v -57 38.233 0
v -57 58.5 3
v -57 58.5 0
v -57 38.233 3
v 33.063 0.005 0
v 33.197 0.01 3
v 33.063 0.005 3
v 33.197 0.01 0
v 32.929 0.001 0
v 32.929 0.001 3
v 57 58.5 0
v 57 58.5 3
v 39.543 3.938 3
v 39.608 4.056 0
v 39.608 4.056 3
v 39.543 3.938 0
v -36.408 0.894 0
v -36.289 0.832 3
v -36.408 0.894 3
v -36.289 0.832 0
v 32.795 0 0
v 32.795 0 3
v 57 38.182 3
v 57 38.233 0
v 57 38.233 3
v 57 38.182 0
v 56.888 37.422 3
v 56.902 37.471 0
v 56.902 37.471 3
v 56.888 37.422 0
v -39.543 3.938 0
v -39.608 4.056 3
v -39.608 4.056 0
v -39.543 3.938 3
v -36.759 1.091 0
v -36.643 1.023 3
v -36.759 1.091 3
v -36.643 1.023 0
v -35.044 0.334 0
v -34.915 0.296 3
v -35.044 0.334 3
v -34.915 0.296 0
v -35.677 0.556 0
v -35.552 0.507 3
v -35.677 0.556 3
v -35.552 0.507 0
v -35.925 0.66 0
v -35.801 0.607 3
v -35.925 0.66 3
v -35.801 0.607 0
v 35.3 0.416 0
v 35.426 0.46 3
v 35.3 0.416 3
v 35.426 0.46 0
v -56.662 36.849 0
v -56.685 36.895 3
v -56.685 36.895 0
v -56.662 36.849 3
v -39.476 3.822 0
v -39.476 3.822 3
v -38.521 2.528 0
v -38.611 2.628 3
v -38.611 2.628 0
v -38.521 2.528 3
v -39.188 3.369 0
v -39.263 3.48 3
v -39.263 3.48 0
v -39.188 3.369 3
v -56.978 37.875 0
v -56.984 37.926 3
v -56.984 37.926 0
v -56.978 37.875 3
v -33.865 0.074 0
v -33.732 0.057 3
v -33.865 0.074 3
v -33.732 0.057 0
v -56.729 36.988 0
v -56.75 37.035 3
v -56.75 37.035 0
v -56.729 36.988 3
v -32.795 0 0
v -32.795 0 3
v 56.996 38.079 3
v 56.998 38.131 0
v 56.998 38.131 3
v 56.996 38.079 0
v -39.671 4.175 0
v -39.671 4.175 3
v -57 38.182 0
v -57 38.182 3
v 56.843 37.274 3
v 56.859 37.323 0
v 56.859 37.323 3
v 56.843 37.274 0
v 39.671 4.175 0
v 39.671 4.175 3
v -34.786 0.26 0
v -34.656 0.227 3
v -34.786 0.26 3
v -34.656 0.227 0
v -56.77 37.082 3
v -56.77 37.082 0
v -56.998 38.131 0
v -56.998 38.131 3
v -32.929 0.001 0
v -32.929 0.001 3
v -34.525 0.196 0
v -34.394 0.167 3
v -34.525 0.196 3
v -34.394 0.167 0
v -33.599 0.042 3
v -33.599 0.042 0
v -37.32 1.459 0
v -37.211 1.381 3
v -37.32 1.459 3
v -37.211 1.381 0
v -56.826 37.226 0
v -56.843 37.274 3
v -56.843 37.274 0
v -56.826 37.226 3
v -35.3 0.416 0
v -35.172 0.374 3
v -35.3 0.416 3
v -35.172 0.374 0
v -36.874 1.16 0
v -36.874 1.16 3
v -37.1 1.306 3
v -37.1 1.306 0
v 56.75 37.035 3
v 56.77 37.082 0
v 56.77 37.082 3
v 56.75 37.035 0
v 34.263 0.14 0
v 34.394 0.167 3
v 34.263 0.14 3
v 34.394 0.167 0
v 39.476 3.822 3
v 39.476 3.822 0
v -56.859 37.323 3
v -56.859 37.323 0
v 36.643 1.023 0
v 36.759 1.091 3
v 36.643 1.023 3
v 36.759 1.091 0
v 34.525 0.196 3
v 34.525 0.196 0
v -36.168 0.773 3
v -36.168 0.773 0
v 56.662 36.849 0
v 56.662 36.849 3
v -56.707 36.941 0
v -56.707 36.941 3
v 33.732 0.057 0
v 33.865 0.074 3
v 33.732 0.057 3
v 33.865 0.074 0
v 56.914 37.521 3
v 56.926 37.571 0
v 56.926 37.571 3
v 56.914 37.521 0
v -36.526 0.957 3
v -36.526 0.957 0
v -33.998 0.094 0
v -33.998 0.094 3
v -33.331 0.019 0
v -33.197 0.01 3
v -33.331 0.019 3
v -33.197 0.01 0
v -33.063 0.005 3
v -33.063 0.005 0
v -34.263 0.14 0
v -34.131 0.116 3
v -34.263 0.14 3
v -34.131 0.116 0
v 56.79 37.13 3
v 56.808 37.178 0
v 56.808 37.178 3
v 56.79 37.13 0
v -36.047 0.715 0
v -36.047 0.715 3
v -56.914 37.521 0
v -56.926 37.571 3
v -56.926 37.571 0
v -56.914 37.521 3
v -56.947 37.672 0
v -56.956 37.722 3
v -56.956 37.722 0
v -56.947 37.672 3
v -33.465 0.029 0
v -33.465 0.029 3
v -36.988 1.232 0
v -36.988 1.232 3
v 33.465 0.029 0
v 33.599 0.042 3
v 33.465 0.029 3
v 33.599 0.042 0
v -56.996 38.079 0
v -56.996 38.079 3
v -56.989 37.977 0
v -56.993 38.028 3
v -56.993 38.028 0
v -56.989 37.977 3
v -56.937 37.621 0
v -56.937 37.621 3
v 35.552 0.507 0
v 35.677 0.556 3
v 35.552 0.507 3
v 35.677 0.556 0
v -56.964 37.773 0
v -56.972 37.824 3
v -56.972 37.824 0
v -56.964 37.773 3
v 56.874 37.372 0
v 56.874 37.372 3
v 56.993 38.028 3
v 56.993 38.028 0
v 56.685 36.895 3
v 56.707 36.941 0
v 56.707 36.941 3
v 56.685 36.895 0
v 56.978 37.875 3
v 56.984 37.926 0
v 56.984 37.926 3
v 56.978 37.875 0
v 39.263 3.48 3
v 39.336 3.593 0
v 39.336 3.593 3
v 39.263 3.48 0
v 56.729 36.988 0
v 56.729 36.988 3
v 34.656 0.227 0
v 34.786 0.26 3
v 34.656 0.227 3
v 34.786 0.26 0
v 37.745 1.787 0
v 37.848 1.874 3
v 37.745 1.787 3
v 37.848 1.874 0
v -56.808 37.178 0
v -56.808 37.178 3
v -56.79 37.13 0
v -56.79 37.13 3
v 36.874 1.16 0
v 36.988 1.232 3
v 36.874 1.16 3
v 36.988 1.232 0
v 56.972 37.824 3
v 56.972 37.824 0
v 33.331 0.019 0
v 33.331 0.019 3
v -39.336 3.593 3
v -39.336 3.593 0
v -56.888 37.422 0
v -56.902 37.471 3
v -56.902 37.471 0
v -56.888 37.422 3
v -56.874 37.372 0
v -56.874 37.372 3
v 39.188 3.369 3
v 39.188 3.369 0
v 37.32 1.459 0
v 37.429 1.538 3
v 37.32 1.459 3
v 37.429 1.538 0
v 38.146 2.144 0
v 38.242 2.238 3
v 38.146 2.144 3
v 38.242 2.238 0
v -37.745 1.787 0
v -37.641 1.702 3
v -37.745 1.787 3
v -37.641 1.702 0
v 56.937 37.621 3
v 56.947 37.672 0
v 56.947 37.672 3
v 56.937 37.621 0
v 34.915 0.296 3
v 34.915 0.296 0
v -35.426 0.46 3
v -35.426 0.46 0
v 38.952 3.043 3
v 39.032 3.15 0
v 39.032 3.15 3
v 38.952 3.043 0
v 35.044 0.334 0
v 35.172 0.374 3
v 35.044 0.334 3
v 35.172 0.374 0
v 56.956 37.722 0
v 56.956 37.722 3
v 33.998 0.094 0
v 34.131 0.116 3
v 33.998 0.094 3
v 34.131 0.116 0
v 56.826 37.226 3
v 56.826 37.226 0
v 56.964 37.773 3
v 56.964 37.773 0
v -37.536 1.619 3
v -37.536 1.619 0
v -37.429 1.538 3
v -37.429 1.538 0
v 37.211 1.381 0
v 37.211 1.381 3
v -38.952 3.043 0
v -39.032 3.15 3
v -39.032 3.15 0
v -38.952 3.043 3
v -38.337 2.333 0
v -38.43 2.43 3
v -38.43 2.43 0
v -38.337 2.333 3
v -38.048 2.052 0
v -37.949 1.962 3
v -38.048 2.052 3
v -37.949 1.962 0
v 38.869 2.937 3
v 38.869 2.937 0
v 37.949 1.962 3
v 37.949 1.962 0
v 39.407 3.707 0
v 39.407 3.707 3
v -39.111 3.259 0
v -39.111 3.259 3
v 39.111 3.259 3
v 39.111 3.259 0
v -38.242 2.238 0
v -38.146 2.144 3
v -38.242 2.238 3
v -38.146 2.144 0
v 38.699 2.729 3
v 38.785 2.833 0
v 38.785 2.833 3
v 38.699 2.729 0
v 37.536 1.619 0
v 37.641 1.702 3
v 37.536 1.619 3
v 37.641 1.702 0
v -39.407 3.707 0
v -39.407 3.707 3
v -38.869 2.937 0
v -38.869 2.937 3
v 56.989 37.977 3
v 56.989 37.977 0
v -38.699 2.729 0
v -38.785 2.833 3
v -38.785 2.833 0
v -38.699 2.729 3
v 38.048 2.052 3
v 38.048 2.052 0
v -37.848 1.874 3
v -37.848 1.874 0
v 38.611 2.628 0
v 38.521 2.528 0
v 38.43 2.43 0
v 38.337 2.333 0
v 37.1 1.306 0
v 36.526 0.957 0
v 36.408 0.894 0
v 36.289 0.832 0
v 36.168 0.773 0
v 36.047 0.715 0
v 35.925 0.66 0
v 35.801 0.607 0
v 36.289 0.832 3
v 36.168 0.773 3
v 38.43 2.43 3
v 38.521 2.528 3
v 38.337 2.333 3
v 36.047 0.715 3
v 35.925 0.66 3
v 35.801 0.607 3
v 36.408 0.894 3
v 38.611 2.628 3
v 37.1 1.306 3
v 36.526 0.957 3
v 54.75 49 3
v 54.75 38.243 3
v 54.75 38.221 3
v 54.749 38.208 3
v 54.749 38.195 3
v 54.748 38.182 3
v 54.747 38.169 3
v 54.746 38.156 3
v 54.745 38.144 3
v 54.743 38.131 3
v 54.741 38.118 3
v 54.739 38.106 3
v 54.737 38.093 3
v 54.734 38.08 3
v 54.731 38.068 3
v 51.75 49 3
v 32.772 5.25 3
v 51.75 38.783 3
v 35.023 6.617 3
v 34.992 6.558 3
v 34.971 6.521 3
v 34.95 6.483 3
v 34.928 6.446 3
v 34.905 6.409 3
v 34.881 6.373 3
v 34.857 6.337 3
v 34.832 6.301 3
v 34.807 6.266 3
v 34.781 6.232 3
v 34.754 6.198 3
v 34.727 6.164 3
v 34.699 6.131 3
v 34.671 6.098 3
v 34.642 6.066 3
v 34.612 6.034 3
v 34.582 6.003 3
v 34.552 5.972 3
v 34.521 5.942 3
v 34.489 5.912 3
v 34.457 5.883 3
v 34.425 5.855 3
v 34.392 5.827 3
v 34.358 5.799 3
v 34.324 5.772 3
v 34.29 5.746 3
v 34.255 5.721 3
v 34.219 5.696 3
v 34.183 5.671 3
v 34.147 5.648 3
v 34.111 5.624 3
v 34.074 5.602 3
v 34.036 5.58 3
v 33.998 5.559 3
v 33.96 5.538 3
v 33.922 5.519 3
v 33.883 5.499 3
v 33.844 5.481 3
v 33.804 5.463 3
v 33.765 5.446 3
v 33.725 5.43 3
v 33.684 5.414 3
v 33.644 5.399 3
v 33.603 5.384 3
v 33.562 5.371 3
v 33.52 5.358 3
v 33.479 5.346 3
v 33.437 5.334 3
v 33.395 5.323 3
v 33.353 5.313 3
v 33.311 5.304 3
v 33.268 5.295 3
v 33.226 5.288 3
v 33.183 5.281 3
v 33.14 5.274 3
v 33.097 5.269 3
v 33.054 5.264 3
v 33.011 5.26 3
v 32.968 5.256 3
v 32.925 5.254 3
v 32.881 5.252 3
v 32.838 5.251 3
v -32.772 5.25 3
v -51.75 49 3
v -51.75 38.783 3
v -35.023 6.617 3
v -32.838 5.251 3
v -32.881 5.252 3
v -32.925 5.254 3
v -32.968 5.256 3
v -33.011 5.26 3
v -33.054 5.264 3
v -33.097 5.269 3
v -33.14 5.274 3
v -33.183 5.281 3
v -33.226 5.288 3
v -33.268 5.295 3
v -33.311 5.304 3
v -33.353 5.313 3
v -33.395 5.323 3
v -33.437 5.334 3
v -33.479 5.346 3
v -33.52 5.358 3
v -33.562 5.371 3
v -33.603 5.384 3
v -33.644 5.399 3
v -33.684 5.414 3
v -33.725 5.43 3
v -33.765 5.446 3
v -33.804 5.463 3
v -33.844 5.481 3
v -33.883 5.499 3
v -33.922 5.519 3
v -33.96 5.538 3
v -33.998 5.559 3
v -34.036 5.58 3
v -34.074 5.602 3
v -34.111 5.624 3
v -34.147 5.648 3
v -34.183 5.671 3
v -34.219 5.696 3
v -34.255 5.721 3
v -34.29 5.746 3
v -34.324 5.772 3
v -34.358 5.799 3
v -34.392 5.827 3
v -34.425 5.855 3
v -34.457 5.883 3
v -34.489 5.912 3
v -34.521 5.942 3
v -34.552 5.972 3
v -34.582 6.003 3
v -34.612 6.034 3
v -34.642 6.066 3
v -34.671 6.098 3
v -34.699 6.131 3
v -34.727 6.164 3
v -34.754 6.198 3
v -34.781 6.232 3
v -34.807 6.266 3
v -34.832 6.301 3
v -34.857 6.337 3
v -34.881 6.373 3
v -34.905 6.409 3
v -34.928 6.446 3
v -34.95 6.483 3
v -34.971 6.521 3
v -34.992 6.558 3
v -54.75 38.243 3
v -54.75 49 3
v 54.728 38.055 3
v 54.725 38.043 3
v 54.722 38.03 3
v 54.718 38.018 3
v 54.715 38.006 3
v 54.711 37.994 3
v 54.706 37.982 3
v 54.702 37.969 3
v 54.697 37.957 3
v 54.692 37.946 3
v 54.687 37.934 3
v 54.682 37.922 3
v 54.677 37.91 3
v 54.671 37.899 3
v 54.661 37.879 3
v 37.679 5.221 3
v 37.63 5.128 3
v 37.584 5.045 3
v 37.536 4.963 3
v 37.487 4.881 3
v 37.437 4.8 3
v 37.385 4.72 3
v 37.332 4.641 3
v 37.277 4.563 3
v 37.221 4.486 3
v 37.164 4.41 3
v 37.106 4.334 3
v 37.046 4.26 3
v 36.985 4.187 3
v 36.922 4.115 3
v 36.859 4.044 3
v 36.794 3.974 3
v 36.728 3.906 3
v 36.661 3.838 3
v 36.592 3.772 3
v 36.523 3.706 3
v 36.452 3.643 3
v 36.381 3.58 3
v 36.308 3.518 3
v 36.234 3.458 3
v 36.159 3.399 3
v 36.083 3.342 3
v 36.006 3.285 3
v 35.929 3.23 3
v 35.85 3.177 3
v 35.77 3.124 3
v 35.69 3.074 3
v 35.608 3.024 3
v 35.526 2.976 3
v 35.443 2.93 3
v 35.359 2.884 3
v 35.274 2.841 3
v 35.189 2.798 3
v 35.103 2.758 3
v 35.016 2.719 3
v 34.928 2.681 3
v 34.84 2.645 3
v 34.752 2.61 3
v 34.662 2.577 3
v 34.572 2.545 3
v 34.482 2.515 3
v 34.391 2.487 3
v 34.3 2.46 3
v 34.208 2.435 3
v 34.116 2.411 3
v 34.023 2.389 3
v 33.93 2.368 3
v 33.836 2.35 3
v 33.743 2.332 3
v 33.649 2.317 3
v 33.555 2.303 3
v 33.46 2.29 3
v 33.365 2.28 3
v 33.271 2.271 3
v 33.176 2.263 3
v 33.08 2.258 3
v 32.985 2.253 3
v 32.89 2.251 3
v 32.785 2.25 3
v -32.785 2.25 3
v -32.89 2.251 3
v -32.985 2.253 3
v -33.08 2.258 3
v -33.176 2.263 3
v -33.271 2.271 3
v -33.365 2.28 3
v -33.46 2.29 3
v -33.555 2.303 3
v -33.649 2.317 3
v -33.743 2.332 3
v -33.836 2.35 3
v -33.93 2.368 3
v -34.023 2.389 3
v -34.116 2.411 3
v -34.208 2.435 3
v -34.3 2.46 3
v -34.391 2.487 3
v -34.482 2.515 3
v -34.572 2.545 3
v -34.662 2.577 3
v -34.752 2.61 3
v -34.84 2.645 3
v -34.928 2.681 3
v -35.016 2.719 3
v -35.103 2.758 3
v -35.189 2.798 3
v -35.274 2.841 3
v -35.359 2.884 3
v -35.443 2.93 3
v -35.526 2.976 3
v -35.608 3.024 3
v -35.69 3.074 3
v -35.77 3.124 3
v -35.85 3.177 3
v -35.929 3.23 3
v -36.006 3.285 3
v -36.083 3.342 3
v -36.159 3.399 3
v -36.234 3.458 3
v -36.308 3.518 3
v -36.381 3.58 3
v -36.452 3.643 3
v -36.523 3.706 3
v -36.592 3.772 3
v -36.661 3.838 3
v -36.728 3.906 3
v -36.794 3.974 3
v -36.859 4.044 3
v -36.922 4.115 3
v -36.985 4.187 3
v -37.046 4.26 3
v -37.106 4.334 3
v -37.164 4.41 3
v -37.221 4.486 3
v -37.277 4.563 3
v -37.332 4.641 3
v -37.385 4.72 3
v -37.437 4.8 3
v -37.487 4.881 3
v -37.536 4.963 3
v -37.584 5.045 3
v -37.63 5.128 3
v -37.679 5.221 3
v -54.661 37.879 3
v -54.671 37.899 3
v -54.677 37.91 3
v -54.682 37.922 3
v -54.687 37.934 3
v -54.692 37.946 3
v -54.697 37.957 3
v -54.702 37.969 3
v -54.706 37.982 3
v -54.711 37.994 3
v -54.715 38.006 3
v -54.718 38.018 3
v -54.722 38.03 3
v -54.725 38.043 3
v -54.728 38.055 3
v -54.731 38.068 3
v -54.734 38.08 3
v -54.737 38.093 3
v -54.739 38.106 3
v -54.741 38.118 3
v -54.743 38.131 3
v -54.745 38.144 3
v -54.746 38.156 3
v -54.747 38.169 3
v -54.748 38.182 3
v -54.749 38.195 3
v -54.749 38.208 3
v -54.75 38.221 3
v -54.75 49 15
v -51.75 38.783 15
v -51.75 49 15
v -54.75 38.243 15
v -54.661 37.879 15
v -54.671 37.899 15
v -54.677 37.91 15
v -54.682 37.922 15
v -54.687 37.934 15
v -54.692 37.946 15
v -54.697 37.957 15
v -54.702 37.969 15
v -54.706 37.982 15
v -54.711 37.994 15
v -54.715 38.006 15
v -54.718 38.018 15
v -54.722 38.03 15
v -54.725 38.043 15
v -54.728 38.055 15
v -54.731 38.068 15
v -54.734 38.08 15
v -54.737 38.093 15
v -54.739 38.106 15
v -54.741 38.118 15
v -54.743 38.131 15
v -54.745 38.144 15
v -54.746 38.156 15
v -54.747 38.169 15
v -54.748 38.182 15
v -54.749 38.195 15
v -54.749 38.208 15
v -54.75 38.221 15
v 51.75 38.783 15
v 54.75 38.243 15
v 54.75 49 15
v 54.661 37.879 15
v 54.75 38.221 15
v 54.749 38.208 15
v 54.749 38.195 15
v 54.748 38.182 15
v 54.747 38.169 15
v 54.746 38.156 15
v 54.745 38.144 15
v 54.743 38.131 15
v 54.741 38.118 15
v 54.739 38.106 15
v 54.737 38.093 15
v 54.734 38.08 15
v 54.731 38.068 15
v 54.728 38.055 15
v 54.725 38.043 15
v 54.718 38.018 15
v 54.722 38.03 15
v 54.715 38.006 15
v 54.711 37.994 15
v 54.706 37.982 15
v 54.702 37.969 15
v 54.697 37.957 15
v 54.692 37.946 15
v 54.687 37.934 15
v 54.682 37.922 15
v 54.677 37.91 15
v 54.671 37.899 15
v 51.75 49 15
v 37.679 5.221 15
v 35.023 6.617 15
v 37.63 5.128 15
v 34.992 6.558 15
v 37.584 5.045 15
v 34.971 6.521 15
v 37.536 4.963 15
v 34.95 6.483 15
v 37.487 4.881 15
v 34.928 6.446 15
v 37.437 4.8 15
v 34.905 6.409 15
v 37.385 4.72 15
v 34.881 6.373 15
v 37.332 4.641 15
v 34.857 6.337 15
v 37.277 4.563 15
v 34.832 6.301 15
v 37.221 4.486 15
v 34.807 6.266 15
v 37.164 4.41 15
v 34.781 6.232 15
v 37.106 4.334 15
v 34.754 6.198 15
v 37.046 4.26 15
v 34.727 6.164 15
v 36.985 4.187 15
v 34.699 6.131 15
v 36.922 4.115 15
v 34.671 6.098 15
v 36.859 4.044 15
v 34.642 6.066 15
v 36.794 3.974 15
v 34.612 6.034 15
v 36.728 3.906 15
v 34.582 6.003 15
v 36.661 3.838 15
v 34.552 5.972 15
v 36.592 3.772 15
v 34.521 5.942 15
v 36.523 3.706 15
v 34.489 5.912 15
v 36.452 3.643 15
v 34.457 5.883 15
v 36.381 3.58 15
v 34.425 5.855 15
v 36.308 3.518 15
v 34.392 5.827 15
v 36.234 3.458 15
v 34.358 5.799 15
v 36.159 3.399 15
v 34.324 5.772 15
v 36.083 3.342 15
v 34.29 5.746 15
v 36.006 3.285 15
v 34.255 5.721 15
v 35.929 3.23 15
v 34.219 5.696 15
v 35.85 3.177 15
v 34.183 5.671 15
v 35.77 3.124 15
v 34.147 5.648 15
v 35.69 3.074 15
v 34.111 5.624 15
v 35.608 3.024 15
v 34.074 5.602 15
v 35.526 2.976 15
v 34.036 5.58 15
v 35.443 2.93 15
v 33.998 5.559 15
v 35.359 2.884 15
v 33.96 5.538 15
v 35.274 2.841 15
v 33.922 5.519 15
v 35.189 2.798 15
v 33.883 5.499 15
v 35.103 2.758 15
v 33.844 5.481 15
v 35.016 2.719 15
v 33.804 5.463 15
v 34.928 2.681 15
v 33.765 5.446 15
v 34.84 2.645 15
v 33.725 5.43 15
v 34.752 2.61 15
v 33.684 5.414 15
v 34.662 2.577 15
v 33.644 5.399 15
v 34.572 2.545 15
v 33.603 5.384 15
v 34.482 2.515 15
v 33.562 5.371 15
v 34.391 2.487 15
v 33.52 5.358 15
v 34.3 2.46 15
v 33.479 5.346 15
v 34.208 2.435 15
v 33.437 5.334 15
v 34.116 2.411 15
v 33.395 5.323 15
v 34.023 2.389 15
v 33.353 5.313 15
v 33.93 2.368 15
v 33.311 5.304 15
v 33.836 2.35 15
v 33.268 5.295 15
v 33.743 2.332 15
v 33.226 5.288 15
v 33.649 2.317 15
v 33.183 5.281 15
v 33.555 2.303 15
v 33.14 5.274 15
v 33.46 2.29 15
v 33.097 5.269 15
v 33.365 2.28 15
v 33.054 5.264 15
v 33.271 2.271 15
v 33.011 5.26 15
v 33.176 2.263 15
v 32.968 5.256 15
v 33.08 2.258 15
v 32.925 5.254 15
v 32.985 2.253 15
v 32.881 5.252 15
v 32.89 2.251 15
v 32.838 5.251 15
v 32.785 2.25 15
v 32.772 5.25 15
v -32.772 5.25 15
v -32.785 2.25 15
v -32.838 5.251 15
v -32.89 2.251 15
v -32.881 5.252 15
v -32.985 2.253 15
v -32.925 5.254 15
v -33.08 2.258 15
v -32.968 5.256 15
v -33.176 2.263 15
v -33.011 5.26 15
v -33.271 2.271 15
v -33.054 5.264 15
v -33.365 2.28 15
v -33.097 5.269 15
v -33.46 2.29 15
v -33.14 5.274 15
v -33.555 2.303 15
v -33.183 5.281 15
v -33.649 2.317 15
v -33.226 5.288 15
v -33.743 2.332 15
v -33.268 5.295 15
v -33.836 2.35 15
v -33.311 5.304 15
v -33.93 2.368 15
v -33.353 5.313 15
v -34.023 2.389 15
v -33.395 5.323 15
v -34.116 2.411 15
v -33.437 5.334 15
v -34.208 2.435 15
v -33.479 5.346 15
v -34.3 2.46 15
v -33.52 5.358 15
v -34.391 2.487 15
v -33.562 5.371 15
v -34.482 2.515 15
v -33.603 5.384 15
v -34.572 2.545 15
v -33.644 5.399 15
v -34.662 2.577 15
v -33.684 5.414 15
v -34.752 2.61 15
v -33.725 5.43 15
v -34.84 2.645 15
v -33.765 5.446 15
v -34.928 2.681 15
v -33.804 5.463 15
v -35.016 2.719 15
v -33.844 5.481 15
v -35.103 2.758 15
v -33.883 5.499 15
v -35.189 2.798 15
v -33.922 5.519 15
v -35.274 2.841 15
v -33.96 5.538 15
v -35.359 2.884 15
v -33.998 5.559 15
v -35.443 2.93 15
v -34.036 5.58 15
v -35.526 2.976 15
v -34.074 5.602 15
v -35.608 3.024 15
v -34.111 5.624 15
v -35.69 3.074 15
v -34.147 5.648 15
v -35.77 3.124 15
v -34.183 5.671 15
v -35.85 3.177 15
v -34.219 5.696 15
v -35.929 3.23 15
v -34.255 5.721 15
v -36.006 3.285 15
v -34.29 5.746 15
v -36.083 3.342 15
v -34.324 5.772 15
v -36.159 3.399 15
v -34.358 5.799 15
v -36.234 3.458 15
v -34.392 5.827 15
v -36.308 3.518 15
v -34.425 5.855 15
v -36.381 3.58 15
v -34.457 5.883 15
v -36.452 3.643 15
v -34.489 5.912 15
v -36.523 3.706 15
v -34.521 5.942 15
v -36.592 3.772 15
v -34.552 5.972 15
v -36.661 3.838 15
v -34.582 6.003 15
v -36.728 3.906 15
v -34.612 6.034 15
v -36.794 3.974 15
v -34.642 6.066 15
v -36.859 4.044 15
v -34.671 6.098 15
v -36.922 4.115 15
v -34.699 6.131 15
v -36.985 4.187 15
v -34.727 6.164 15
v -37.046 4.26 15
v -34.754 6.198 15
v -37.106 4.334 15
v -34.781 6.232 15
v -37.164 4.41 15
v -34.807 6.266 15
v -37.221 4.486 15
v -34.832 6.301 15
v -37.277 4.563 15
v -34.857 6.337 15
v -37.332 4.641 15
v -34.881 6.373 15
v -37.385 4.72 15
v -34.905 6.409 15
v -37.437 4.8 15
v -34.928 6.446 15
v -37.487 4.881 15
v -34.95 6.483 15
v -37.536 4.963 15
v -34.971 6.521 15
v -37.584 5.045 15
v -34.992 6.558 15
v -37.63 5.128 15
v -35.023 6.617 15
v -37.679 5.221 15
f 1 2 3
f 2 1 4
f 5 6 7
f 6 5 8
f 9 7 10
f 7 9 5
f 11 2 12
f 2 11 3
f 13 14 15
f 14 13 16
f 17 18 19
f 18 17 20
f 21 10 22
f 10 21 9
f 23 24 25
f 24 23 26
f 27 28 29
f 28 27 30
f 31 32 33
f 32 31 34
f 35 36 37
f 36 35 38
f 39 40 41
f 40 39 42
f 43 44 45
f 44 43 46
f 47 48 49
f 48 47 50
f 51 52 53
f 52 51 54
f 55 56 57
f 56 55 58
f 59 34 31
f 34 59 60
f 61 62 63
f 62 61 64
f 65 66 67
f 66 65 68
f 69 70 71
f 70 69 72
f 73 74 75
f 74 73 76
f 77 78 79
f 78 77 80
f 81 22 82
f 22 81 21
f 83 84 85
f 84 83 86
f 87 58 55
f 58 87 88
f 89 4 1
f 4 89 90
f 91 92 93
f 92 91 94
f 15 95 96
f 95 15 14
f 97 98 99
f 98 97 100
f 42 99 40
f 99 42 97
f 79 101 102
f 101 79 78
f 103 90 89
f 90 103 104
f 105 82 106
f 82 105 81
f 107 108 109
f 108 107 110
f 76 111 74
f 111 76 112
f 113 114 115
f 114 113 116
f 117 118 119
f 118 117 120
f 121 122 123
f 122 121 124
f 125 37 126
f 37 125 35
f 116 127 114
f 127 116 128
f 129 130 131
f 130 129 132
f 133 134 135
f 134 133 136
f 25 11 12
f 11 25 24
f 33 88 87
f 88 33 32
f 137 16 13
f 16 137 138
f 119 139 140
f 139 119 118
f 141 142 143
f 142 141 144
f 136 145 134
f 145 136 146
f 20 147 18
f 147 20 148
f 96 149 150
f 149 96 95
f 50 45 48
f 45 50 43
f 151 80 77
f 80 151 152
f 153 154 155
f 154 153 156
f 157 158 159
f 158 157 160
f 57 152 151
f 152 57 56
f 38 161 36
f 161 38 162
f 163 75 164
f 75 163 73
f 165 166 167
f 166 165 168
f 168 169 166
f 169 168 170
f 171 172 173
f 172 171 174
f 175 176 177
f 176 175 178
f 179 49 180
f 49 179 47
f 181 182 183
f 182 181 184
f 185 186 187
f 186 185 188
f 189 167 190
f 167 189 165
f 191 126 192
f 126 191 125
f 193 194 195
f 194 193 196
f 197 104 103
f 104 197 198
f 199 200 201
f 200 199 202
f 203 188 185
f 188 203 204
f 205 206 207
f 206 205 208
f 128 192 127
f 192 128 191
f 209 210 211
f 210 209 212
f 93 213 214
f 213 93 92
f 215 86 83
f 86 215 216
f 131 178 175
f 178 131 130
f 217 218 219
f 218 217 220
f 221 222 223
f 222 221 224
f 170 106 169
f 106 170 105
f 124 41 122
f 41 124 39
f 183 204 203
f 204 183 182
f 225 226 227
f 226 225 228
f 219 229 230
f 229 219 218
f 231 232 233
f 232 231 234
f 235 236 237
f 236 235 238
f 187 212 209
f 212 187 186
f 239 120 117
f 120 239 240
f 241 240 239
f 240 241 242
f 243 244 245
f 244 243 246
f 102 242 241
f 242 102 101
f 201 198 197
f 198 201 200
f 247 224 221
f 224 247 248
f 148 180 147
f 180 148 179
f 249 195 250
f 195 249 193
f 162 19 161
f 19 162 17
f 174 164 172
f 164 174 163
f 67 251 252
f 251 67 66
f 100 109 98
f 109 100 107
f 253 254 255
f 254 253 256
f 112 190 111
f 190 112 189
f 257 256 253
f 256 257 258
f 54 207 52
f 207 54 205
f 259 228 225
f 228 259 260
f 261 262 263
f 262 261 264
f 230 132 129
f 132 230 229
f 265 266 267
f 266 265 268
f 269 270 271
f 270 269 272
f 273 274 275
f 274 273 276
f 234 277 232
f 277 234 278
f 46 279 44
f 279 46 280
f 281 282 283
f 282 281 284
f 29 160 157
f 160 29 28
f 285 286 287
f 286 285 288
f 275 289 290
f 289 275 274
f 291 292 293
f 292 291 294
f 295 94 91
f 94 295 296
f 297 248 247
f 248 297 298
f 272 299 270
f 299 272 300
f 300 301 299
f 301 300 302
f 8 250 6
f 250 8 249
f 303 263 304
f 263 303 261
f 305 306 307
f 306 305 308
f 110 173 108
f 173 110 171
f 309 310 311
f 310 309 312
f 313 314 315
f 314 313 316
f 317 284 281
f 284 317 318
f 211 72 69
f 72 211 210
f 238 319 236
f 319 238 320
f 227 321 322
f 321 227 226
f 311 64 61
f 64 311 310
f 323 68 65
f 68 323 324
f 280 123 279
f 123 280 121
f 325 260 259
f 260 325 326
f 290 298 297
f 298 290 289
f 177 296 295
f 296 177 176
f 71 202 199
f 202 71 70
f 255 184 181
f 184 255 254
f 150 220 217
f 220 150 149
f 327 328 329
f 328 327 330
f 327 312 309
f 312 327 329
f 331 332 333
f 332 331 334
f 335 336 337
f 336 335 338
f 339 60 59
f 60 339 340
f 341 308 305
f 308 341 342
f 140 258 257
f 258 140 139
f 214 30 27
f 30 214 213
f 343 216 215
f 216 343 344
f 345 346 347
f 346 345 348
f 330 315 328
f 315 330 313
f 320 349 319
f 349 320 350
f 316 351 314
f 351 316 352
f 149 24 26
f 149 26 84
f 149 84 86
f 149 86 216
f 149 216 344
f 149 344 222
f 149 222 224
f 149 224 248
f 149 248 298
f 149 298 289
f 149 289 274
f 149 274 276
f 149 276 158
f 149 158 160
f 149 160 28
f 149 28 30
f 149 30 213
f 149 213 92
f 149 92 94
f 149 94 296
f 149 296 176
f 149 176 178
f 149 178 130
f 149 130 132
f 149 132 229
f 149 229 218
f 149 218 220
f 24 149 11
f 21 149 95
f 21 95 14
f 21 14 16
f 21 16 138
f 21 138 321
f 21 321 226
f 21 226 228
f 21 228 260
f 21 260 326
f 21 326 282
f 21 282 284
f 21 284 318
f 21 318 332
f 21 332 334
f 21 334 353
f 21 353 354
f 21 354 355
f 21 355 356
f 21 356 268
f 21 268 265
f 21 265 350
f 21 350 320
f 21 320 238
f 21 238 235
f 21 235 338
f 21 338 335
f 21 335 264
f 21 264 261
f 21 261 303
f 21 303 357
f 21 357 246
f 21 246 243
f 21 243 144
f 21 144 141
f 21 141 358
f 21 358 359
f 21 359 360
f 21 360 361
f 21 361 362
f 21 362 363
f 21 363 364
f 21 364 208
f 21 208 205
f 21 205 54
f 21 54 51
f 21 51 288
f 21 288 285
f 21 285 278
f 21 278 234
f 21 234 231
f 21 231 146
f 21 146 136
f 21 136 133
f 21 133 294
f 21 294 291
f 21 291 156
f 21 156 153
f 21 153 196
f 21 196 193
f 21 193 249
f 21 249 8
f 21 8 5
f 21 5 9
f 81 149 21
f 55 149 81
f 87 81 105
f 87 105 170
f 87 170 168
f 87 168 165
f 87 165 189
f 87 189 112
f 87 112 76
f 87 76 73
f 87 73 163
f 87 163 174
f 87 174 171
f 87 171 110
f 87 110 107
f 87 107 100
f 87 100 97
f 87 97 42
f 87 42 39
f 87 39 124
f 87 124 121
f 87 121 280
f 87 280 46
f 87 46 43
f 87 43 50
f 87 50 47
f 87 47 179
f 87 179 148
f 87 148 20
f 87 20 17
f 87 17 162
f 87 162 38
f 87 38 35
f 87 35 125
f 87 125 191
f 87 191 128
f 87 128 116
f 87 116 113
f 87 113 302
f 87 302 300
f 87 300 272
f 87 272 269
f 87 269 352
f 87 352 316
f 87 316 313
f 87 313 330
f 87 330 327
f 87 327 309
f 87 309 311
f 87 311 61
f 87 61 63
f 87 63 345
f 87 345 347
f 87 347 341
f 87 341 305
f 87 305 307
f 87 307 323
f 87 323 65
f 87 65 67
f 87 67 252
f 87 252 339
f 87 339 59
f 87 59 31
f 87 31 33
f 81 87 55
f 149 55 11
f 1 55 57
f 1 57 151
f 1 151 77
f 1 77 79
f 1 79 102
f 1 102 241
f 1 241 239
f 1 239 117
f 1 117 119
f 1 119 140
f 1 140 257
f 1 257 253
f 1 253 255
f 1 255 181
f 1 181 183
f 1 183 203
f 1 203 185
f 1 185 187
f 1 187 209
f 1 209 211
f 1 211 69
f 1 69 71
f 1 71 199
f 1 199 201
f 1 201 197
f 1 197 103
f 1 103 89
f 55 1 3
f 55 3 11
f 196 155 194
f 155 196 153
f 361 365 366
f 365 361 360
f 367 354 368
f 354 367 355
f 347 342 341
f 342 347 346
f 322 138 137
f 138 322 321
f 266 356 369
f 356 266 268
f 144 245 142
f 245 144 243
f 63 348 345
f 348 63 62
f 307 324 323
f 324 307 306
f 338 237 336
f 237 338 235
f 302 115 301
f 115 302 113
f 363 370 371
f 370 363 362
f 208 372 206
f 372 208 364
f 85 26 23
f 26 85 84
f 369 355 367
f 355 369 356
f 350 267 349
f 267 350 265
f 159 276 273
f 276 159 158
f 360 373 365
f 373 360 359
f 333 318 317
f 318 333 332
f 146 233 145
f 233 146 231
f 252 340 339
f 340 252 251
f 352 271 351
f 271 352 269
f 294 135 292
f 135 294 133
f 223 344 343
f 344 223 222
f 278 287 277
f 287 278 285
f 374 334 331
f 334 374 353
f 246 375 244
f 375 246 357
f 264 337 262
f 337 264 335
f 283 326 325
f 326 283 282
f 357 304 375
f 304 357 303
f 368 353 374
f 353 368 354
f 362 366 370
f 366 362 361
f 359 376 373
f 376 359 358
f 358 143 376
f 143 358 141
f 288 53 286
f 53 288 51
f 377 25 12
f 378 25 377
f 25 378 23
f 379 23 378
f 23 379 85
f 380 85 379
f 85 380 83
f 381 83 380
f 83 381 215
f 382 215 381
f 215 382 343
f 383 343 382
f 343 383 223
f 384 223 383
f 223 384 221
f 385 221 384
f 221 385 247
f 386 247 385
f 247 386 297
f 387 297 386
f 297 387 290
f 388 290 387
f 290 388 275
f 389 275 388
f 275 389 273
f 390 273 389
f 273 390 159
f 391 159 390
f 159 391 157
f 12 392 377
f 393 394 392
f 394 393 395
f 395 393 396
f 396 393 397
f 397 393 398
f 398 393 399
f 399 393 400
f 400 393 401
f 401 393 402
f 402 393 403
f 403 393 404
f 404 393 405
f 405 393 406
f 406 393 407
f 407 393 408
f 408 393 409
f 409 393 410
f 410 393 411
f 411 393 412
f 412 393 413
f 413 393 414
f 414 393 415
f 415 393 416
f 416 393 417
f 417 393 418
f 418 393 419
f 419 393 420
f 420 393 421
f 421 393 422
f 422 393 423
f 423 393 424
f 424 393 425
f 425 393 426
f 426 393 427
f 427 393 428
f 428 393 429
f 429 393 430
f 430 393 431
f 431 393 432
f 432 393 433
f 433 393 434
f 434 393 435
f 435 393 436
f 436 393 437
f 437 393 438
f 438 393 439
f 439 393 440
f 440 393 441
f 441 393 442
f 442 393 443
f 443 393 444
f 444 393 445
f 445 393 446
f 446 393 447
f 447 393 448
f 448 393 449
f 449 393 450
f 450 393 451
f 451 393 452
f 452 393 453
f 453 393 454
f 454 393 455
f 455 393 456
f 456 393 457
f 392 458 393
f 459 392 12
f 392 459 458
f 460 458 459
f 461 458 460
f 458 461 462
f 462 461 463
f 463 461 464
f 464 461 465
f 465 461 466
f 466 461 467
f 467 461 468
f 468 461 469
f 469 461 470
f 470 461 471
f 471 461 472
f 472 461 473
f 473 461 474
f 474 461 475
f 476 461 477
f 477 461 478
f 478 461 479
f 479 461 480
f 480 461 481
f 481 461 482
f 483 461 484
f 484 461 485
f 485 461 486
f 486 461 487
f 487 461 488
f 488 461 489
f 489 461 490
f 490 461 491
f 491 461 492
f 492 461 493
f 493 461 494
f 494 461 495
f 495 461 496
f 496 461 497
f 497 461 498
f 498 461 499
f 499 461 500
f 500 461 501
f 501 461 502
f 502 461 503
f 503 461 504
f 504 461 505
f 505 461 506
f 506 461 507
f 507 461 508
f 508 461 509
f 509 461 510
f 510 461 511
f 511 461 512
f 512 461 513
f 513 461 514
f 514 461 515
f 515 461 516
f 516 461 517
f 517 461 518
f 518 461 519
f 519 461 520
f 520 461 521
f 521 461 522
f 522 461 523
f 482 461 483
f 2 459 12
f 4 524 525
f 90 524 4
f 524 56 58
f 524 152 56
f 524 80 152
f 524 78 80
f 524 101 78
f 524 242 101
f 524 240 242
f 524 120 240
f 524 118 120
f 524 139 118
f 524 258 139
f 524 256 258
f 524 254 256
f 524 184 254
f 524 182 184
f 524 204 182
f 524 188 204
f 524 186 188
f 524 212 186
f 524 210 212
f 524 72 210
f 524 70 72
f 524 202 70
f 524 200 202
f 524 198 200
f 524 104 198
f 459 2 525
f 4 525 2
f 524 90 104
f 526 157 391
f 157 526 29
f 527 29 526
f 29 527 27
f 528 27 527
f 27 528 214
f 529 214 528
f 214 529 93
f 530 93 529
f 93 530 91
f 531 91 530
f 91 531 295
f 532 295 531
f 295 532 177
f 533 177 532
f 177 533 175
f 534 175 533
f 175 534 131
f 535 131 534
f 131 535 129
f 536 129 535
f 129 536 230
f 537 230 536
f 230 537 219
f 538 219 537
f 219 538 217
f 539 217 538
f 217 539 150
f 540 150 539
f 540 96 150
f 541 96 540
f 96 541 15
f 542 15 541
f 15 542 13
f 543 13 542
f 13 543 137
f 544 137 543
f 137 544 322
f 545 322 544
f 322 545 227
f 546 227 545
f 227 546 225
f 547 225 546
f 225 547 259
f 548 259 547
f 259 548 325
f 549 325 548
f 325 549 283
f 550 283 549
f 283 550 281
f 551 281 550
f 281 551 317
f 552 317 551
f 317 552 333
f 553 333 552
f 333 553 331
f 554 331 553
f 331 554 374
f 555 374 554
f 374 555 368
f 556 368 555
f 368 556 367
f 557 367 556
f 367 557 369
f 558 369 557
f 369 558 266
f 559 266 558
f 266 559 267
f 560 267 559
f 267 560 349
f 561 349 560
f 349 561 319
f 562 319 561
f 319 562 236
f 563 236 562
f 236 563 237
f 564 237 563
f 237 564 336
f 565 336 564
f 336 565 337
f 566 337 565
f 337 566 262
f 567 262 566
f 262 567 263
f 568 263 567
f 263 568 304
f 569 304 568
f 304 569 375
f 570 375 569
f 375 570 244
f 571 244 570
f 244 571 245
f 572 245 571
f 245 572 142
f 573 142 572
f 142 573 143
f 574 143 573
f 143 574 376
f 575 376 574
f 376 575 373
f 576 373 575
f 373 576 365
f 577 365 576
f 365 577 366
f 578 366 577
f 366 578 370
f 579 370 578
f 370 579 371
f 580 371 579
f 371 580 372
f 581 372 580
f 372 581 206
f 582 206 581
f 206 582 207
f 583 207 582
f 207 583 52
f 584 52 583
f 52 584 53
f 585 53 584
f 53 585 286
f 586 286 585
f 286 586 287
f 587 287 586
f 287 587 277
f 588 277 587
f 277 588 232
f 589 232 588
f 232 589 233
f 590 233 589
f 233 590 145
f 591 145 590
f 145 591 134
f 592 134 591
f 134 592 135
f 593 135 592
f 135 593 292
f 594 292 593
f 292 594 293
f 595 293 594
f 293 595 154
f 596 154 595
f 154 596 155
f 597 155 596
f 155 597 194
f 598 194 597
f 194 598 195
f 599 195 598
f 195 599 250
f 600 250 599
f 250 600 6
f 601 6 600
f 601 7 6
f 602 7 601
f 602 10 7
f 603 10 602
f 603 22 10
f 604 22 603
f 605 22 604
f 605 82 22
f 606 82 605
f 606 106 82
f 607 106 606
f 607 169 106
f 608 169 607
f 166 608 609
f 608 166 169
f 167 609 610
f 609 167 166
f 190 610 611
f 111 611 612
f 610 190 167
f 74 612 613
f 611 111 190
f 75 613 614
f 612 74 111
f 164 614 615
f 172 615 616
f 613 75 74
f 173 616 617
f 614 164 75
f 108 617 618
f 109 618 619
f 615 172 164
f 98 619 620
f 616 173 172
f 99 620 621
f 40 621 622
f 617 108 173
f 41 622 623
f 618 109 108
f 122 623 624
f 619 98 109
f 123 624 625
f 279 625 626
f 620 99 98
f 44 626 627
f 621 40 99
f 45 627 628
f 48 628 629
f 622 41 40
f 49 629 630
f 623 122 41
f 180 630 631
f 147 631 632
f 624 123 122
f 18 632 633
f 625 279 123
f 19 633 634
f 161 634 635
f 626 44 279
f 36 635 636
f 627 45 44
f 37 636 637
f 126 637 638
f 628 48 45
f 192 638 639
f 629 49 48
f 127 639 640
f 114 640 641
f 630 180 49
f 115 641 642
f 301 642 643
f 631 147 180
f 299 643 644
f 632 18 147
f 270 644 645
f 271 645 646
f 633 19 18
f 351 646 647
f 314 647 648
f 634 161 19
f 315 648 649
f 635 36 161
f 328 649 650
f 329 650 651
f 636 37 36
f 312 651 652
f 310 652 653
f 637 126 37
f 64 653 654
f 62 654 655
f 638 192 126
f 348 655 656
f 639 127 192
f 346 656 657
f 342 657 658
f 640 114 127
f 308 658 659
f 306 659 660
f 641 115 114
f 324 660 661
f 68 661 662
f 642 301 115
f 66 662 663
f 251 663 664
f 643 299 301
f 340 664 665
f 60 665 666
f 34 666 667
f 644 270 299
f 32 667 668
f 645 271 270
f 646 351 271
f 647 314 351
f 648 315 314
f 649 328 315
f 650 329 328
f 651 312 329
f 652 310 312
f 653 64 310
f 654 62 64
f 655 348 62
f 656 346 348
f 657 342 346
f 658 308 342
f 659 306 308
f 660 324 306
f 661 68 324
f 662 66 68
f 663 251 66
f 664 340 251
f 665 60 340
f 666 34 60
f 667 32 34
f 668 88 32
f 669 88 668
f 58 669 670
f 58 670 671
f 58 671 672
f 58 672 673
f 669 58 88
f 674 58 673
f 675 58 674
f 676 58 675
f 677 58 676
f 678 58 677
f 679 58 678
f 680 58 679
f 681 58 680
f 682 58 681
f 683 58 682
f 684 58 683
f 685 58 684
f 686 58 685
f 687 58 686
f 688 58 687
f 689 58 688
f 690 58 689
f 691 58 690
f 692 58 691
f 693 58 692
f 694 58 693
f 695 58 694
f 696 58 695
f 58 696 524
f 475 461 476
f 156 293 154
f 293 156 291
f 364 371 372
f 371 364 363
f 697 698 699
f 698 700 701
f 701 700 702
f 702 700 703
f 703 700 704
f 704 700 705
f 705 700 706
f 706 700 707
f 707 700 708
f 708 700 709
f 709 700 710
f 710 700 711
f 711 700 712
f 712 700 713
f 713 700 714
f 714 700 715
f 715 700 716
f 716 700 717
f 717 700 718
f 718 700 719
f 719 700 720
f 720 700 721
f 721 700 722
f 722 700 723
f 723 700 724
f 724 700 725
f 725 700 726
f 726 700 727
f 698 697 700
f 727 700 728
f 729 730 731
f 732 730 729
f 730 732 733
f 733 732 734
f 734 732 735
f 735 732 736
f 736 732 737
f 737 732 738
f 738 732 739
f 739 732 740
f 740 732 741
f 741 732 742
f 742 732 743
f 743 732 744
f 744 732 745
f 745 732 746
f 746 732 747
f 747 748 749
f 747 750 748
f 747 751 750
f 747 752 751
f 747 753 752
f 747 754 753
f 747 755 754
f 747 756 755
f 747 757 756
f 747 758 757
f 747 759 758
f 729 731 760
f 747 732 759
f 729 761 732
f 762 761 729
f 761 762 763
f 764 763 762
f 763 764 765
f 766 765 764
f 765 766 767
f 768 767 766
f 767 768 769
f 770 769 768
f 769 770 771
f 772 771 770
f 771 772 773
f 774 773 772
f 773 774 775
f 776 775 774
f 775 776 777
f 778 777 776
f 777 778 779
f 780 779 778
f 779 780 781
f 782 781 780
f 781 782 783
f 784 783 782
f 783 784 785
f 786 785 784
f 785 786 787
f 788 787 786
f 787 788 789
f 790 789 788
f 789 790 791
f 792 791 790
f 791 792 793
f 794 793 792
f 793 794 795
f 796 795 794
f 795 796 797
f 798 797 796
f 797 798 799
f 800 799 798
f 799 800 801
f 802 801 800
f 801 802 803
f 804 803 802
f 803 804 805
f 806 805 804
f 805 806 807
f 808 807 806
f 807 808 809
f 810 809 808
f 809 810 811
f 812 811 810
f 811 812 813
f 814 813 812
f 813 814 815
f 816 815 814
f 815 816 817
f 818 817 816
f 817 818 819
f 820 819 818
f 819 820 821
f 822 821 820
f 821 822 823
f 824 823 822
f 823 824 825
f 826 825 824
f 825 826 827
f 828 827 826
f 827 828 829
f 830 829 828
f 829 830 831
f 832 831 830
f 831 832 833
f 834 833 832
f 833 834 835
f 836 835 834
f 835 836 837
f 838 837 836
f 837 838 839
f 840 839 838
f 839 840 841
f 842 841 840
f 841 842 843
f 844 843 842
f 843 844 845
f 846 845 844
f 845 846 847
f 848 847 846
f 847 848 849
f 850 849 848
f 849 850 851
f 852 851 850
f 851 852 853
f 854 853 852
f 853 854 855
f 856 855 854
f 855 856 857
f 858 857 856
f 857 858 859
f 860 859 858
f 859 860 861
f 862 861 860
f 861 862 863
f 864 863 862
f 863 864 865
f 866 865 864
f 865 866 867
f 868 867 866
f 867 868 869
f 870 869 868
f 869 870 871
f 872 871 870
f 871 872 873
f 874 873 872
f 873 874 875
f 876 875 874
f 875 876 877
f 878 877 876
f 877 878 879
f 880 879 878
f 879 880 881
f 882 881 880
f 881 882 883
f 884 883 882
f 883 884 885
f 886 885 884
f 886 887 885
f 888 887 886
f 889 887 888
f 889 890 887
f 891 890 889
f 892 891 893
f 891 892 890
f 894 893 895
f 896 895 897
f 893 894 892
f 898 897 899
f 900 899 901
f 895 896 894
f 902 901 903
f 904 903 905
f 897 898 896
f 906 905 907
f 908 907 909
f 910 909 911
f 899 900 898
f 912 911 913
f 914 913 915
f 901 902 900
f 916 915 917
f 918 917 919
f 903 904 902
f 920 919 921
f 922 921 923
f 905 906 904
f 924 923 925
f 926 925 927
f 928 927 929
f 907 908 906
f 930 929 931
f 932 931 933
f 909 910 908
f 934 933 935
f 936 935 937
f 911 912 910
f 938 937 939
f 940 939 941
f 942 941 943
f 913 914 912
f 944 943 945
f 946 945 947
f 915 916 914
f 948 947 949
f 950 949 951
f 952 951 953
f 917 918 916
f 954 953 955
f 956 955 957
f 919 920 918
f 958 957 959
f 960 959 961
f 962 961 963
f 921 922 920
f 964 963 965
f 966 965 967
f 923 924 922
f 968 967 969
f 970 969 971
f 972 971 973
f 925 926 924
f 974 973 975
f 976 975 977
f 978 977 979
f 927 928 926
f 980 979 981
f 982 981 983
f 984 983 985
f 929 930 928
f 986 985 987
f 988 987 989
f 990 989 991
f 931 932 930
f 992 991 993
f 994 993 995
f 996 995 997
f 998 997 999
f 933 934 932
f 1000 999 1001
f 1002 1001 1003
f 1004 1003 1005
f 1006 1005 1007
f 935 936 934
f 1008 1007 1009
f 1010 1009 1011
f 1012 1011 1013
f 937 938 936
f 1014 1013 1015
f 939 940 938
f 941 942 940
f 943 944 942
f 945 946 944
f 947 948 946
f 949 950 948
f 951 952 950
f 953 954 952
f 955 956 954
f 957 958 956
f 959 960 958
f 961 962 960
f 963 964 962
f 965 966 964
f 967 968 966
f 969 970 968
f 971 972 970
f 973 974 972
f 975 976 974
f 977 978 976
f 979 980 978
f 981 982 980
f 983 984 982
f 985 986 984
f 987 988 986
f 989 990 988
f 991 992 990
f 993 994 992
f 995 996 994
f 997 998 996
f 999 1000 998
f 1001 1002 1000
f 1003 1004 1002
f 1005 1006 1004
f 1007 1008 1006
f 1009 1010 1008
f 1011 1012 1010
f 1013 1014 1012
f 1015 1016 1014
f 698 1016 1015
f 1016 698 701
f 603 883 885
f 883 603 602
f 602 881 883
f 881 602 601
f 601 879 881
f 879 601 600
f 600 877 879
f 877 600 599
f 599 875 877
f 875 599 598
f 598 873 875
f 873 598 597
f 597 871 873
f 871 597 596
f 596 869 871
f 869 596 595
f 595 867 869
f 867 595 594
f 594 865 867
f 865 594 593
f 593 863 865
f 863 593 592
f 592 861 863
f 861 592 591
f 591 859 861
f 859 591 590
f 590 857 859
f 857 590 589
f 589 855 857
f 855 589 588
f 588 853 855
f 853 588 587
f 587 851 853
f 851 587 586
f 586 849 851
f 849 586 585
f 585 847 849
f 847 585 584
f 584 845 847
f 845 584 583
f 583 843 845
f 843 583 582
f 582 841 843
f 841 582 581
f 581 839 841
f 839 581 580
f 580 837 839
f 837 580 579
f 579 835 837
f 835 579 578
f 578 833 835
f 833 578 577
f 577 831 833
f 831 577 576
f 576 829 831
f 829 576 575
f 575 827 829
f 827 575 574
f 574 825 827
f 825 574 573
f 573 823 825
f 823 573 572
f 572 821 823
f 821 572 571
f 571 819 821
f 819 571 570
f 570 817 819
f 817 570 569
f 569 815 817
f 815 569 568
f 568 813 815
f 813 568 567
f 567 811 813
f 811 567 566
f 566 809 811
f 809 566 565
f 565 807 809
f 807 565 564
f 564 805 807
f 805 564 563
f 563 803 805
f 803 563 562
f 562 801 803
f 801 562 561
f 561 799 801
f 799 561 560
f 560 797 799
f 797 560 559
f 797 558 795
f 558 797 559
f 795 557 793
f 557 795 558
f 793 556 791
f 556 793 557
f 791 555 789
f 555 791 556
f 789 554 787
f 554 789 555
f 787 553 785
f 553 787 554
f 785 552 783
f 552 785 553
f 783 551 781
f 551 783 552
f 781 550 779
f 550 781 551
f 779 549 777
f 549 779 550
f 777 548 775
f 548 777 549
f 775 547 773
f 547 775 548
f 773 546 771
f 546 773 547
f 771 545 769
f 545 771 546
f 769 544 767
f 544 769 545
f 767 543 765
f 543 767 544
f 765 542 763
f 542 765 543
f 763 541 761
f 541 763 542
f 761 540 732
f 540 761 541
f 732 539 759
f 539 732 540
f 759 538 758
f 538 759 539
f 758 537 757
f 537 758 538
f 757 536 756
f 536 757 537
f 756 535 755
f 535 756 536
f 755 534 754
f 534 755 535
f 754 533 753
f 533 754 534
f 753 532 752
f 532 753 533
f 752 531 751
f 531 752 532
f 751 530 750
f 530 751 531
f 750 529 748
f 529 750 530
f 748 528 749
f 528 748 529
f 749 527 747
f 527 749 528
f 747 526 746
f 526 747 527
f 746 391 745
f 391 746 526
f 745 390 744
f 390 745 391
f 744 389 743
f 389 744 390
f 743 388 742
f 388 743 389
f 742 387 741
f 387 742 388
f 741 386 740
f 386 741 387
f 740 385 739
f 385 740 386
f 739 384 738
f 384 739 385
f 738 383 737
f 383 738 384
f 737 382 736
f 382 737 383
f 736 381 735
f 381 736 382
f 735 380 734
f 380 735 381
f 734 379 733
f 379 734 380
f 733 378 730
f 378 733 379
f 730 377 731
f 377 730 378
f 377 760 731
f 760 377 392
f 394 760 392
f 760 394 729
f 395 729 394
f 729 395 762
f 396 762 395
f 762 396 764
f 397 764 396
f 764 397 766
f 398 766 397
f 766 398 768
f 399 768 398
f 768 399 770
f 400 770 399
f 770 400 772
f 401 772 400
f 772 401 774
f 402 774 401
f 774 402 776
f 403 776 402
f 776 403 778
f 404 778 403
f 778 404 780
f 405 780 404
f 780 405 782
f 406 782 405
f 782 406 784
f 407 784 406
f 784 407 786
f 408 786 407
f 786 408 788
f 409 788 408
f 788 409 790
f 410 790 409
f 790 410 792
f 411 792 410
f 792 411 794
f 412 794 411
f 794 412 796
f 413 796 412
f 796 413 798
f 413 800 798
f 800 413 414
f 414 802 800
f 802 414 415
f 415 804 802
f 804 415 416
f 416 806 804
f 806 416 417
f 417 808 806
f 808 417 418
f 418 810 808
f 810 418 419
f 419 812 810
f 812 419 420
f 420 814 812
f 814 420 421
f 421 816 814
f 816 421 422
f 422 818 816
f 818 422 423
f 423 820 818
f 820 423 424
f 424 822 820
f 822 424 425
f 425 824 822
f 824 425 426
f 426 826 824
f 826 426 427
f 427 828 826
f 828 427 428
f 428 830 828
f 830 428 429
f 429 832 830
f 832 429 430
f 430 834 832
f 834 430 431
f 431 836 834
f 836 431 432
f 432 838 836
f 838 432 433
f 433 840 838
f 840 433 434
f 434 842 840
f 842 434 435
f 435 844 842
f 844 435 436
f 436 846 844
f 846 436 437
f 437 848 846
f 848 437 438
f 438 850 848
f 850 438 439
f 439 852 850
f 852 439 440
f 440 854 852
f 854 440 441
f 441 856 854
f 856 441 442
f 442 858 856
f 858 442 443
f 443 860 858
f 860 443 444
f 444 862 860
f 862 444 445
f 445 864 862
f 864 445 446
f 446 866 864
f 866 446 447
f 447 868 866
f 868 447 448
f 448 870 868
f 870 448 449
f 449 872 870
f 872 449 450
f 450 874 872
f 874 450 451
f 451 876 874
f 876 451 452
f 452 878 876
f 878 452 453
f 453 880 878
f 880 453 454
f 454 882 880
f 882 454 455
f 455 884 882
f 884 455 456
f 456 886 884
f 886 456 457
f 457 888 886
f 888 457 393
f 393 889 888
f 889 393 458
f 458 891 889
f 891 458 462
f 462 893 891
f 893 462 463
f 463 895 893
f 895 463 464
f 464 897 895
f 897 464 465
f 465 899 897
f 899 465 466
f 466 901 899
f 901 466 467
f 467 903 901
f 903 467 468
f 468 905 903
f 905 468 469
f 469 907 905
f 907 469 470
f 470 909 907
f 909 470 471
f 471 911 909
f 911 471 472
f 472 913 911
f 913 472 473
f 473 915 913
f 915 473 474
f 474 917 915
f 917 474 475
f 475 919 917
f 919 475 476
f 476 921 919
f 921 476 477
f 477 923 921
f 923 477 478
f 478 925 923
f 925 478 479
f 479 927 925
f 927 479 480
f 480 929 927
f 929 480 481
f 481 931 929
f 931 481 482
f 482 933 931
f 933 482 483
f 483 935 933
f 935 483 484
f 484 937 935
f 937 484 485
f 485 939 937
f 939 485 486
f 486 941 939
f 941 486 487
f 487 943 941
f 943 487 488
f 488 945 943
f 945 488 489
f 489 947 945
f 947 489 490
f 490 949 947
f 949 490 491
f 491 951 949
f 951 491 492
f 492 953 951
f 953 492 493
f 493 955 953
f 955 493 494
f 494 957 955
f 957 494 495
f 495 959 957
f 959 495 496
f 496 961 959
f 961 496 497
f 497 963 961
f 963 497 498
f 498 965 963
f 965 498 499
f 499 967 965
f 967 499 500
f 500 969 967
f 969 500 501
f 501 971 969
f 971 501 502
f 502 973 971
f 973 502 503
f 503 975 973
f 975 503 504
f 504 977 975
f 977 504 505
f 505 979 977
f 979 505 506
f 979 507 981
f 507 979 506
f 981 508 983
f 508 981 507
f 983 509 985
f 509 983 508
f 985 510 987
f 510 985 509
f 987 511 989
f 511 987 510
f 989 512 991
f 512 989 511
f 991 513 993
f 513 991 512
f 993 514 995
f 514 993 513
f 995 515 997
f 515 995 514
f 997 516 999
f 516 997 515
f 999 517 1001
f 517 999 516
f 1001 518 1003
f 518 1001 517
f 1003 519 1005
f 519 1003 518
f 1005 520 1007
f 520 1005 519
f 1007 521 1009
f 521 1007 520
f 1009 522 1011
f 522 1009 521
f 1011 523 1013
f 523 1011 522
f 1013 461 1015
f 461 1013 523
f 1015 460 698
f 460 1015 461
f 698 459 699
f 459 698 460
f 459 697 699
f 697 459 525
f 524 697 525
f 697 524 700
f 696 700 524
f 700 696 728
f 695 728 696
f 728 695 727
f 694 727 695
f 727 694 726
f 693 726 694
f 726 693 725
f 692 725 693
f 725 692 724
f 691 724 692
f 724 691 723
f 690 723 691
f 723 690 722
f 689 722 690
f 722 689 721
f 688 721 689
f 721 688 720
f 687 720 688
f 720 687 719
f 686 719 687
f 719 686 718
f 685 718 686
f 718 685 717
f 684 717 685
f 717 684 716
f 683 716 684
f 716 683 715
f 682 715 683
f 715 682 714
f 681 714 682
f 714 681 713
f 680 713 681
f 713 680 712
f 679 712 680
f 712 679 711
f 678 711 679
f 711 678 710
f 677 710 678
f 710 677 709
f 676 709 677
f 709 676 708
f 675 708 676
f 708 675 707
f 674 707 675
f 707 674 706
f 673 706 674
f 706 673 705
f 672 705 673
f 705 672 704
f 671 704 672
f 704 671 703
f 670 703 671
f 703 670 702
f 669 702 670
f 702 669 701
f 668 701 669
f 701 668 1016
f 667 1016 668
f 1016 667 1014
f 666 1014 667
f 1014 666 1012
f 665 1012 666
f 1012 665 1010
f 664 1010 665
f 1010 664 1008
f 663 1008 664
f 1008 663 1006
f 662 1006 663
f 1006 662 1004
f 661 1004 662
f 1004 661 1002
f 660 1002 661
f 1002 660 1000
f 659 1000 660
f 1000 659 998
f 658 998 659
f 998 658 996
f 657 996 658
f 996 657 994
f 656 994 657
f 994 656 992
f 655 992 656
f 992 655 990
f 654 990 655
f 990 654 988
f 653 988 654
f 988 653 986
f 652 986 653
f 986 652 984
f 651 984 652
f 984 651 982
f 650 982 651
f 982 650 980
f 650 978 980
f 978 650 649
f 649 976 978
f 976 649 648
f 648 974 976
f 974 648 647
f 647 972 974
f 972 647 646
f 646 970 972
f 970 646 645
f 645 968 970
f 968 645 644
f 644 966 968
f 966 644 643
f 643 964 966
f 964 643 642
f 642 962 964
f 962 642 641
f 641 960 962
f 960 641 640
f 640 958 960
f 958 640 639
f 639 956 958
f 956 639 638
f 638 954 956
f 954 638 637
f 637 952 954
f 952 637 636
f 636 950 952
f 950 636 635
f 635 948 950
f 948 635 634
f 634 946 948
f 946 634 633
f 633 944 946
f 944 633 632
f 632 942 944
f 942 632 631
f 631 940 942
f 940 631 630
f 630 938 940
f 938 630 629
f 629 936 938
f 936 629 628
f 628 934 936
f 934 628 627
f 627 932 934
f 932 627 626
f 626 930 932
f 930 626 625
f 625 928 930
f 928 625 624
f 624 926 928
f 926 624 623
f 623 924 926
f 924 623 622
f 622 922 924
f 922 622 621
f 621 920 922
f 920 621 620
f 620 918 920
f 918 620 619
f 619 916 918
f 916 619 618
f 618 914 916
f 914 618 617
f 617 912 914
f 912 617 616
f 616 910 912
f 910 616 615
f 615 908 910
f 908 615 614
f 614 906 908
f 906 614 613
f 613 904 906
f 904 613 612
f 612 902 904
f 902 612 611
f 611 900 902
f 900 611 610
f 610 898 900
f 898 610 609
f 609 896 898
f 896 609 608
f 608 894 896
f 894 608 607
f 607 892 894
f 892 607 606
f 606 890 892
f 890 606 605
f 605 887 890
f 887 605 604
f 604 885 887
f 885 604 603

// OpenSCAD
color([0.20, 0.53, 0.59]) {
include <../parts/three_d_print_filament_manufacture_cooling_tank_cap_end_solide_15_mm_depth_version_3/3dpr.scad>;
}
